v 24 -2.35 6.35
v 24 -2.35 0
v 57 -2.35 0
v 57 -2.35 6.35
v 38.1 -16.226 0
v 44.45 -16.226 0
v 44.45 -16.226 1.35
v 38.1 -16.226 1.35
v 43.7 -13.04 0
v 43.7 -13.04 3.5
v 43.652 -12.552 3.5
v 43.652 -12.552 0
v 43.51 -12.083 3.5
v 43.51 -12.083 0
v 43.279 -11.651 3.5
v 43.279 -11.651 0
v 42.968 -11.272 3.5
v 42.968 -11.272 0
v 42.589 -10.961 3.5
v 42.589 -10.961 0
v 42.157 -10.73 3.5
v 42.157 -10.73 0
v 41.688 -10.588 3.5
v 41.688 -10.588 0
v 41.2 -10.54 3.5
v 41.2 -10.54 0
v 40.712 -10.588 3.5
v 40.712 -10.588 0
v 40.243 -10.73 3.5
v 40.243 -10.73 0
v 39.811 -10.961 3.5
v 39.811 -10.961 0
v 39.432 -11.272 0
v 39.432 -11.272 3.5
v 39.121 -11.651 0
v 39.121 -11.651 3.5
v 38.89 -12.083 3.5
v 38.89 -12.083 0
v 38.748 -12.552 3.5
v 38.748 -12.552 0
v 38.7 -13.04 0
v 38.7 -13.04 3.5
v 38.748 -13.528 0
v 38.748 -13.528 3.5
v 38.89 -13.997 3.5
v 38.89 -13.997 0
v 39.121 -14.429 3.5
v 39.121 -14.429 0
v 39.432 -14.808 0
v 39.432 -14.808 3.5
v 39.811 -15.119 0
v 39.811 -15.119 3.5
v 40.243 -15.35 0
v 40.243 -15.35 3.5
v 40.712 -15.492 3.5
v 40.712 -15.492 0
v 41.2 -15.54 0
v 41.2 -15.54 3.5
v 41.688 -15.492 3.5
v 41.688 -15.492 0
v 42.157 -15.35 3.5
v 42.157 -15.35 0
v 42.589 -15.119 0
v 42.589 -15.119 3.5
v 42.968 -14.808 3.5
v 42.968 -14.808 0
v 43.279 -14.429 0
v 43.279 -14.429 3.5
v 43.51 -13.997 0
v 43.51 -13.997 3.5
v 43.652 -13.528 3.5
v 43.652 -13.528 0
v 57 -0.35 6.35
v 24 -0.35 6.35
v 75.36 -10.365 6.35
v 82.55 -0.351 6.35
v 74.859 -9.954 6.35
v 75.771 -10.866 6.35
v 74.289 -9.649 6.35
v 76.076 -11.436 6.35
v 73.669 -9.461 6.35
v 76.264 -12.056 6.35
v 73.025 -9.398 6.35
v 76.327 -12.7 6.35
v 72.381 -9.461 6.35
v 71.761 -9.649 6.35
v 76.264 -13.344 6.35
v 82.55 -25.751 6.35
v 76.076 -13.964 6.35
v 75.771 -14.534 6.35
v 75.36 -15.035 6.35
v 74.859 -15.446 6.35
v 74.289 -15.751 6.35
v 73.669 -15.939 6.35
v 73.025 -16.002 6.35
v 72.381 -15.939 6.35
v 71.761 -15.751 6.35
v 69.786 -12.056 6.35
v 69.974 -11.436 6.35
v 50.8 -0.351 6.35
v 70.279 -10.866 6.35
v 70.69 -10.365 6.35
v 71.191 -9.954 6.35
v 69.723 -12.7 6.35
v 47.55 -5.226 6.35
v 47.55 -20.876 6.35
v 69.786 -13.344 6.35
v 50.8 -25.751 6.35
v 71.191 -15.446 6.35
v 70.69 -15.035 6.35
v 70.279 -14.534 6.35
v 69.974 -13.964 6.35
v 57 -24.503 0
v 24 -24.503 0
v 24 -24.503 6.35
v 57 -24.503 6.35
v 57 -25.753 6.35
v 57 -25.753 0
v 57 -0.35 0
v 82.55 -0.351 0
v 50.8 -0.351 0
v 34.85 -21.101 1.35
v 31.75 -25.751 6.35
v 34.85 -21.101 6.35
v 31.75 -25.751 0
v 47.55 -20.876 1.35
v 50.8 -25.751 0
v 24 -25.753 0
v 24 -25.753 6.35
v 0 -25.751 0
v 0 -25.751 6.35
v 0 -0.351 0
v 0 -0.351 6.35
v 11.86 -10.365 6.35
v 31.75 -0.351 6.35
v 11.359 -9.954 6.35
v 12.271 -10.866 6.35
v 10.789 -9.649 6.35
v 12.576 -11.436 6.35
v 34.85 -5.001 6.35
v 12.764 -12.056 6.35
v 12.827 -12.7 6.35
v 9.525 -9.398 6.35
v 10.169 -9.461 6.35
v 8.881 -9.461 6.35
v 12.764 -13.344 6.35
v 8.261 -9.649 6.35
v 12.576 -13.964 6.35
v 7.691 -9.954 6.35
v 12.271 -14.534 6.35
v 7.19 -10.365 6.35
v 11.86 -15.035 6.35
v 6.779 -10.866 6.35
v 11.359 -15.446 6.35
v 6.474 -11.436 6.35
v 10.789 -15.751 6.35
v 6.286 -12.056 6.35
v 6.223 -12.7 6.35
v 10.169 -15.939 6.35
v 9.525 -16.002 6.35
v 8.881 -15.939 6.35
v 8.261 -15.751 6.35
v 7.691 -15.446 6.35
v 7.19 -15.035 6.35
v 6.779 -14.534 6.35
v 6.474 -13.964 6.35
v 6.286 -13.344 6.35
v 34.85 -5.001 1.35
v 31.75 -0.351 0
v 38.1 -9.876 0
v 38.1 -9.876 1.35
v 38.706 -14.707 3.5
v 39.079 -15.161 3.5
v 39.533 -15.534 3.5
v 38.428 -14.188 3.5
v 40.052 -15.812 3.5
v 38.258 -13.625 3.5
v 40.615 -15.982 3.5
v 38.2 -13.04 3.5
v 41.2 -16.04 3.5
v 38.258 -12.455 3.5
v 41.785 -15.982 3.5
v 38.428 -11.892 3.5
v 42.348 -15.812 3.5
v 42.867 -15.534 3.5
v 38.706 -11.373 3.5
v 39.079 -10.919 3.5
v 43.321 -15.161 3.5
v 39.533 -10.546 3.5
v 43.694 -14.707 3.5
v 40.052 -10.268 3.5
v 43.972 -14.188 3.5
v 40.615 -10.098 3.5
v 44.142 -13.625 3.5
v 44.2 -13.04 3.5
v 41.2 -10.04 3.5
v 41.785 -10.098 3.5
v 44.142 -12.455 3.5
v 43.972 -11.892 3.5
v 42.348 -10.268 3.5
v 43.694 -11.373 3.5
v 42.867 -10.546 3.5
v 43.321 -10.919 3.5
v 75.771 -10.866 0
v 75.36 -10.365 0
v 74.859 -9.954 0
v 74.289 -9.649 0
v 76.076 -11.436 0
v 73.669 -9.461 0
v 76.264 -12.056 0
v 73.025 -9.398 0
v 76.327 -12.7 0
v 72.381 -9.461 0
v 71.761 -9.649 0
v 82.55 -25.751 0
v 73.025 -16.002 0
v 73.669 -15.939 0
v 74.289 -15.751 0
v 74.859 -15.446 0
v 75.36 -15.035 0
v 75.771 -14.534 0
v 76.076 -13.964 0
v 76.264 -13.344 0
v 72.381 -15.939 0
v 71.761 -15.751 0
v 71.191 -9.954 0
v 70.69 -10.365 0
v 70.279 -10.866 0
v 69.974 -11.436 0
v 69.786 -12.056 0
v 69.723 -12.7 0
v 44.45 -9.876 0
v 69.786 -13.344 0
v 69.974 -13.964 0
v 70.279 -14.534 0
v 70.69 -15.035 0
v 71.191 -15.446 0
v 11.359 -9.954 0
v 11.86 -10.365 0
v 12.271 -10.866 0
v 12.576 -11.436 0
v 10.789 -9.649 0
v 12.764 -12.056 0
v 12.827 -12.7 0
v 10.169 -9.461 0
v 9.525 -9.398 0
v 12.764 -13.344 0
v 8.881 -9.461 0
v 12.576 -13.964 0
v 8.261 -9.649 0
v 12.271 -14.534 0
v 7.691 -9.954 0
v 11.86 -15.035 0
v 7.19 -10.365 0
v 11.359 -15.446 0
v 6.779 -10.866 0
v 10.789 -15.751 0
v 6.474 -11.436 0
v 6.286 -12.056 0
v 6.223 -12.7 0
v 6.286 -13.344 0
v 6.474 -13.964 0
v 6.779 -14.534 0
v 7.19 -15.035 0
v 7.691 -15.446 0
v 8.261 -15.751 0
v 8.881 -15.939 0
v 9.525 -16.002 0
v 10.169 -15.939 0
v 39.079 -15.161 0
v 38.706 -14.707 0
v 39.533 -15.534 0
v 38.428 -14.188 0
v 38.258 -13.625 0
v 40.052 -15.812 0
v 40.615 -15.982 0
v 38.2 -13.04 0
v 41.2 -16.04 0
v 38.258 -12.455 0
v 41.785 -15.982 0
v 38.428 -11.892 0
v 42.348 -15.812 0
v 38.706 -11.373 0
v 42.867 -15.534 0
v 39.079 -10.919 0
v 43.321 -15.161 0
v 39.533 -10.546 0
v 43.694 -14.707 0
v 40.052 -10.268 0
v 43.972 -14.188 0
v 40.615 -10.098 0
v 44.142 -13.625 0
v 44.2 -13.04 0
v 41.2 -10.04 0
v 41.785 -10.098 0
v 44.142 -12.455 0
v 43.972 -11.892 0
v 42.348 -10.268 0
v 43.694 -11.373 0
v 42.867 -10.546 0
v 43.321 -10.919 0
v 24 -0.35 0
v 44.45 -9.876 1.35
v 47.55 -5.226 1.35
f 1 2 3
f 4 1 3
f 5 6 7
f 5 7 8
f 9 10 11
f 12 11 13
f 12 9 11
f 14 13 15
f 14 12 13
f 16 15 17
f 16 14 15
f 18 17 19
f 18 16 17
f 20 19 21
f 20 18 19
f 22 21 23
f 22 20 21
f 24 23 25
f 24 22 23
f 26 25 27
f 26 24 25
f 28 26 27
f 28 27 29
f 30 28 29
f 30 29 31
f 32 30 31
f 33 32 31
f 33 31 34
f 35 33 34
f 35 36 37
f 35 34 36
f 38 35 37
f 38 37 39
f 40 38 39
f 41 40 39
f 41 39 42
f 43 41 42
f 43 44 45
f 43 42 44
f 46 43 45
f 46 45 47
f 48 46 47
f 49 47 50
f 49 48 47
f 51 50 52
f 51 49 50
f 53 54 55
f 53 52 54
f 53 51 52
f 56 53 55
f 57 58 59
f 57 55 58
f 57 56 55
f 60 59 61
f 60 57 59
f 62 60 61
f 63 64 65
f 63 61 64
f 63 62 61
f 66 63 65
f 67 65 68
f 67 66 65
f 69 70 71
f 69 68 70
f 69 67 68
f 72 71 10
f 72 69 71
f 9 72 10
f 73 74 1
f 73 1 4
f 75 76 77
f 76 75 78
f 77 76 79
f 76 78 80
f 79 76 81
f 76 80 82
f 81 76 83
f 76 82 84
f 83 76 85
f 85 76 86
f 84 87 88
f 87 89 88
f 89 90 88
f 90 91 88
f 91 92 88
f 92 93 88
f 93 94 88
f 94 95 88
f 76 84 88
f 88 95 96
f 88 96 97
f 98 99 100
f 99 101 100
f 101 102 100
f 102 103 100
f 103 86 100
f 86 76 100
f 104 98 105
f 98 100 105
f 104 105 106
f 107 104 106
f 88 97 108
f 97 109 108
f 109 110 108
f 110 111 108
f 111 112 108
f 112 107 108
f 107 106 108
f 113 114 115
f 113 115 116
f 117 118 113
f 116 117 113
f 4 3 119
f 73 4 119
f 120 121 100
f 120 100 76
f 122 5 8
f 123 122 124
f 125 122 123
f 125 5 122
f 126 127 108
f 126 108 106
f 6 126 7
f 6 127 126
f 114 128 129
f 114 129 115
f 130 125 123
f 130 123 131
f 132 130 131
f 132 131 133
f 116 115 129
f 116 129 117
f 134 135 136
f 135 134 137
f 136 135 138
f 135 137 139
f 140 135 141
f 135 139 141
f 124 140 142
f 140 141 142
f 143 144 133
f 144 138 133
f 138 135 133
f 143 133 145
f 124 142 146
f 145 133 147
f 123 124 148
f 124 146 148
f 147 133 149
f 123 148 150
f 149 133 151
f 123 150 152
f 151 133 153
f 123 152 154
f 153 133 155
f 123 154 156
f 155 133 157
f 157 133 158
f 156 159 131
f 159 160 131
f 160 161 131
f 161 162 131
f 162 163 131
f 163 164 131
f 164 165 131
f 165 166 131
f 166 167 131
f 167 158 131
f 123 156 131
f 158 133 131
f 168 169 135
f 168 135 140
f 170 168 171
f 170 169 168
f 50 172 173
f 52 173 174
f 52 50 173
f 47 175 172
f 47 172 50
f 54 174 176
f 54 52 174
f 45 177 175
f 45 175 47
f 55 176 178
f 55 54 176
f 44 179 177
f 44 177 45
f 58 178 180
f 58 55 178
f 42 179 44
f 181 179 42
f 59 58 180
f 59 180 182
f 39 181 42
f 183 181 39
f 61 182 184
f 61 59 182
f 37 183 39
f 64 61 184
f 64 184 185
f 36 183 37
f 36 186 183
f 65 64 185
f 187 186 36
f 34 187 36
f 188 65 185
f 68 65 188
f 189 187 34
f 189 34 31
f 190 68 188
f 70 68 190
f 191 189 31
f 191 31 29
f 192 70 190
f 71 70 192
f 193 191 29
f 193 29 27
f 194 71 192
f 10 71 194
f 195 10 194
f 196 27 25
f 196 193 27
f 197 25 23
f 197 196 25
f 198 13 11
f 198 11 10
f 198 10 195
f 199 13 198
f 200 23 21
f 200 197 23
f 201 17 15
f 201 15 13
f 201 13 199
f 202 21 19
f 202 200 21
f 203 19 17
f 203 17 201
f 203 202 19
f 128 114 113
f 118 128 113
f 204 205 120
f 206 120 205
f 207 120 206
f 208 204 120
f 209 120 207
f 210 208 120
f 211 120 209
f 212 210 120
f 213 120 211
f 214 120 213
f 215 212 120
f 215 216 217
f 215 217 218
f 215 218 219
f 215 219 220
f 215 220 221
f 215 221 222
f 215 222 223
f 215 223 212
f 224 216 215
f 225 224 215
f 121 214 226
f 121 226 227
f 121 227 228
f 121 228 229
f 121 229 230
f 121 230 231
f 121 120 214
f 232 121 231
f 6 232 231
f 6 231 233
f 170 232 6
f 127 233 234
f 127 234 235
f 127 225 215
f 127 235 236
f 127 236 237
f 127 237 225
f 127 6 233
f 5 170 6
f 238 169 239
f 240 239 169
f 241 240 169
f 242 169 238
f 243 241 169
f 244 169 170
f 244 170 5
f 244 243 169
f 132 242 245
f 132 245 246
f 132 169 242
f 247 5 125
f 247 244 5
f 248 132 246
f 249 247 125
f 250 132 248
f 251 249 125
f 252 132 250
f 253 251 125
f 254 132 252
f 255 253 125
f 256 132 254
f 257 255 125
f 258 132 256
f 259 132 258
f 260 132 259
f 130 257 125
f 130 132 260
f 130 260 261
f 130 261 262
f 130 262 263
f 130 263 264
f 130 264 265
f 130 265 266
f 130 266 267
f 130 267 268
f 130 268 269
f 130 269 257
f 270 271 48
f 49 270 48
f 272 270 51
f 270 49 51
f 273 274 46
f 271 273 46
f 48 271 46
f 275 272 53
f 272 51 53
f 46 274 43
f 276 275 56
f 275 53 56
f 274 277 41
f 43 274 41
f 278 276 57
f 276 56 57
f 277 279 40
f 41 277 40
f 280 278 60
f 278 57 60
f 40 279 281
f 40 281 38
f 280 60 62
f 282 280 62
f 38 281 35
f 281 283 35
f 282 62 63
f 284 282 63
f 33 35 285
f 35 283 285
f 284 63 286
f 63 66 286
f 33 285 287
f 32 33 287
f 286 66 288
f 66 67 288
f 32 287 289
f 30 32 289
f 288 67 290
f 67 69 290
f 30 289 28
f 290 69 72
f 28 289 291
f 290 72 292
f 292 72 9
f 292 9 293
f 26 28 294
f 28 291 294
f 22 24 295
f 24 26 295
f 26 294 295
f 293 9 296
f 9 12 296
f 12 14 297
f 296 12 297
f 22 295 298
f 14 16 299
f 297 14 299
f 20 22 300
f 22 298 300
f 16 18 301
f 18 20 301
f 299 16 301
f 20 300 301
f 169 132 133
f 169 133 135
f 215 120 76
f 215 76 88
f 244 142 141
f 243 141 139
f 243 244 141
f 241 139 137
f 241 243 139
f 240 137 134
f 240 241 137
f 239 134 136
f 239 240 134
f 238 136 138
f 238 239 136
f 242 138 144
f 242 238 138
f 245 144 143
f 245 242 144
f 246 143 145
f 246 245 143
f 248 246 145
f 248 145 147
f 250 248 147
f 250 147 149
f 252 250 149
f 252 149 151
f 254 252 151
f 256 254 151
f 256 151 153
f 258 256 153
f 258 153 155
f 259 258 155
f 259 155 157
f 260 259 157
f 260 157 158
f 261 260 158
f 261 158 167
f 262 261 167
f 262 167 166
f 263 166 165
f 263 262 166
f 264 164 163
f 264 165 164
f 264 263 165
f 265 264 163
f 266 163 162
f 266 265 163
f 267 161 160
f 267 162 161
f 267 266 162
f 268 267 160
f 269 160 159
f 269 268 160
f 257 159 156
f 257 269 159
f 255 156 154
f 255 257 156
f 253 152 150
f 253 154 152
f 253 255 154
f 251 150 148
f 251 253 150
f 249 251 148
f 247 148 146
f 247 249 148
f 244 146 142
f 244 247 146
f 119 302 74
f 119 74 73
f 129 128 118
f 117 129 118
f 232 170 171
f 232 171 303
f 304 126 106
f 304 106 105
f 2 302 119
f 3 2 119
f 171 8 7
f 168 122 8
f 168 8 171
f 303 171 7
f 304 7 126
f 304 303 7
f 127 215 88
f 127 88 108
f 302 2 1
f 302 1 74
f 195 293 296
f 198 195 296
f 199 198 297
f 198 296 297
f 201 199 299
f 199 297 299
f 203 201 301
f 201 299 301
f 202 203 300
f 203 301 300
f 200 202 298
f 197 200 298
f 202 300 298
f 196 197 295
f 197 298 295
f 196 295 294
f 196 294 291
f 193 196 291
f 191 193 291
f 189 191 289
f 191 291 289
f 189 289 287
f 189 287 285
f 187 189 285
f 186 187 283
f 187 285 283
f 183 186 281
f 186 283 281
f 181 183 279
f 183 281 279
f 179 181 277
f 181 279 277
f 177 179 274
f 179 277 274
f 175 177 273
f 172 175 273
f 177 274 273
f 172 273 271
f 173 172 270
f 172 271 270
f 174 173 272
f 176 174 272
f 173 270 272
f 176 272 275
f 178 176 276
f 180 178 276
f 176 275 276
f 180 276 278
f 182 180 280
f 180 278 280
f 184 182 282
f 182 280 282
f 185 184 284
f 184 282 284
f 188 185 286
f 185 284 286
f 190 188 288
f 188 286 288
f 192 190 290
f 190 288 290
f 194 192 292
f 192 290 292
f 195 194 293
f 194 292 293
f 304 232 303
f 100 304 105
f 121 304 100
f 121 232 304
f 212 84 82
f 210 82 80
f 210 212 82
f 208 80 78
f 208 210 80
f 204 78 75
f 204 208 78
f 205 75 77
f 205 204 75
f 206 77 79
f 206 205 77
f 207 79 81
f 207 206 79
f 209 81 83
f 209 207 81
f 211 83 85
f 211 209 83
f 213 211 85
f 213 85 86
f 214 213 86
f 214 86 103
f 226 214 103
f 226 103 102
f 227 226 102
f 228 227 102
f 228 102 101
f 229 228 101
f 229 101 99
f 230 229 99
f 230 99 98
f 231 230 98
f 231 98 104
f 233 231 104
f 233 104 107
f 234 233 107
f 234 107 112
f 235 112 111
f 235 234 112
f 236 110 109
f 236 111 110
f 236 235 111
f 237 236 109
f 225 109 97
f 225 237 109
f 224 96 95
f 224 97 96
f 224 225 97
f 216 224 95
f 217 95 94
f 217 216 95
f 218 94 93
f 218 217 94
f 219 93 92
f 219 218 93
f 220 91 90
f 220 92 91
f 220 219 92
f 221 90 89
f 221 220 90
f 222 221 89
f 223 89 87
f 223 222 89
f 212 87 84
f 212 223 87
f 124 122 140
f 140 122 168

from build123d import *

# Parameters (mm, degrees)
BOX_W             = 33
BOX_H             = 2
BOX_DEPTH         = 6.35
BOX001_W          = 33
BOX001_H          = 1.25
BOX001_DEPTH      = 6.35
CYLINDER001_R     = 3.302
CYLINDER001_DEPTH = 10
BOX002_W          = 12.7
BOX002_H          = 16.7
BOX002_DEPTH      = 17
CYLINDER_R        = 3.302
CYLINDER_DEPTH    = 10
EXTRUDE_DEPTH     = 6.35
CYLINDER003_R     = 2.5
CYLINDER003_DEPTH = 16
CYLINDER002_R     = 3
CYLINDER002_DEPTH = 3.5


with BuildPart() as support1:
    # Box → Box (new body)
    with BuildSketch(Plane(origin=(24, -2.35, 0), x_dir=(1, 0, 0), z_dir=(0, 0, 1))):
        with Locations((16.5, 1)):
            Rectangle(BOX_W, BOX_H)
    extrude(amount=BOX_DEPTH)


with BuildPart() as support2:
    # Box001 → Box001 (new body)
    with BuildSketch(Plane(origin=(24, -25.753, 0), x_dir=(1, 0, 0), z_dir=(0, 0, 1))):
        with Locations((16.5, 0.625)):
            Rectangle(BOX001_W, BOX001_H)
    extrude(amount=BOX001_DEPTH)


with BuildPart() as hole2:
    # Cylinder001 → Cylinder001 (new body)
    with BuildSketch(Plane(origin=(73.025, -12.7, 0), x_dir=(1, 0, 0), z_dir=(0, 0, 1))):
        Circle(CYLINDER001_R)
    extrude(amount=CYLINDER001_DEPTH)


with BuildPart() as thinner:
    # Box002 → Box002 (new body)
    with BuildSketch(Plane(origin=(34.85, -21.35, 1.35), x_dir=(1, 0, 0), z_dir=(0, 0, 1))):
        with Locations((6.35, 8.35)):
            Rectangle(BOX002_W, BOX002_H)
    extrude(amount=BOX002_DEPTH)


with BuildPart() as fusion:
    # Cylinder → Cylinder (new body)
    with BuildSketch(Plane(origin=(9.525, -12.7, 0), x_dir=(1, 0, 0), z_dir=(0, 0, 1))):
        Circle(CYLINDER_R)
    extrude(amount=CYLINDER_DEPTH)

    # Fusion: union Hole2, Thinner
    add(hole2.part)
    add(thinner.part)


with BuildPart() as cut:
    # rect3338 → Extrude (new body)
    with BuildSketch(Plane(origin=(41.275, -13.050916, 0), x_dir=(0, -1, 0), z_dir=(0, 0, -1))):
        with BuildLine():
            add(Edge.make_bspline(
                [(-12.7, 41.275), (-12.7, 9.525)],
                knots=[0, 0, 112.5, 112.5], degree=1))
            add(Edge.make_bspline(
                [(-12.7, 9.525), (-3.175, 3.175)],
                knots=[0, 0, 40.562452, 40.562452], degree=1))
            add(Edge.make_bspline(
                [(-3.175, 3.175), (-3.175, -3.175)],
                knots=[0, 0, 22.5, 22.5], degree=1))
            add(Edge.make_bspline(
                [(-3.175, -3.175), (-12.7, -9.525)],
                knots=[0, 0, 40.562452, 40.562452], degree=1))
            add(Edge.make_bspline(
                [(-12.7, -9.525), (-12.7, -41.275)],
                knots=[0, 0, 112.5, 112.5], degree=1))
            add(Edge.make_bspline(
                [(-12.7, -41.275), (12.7, -41.275)],
                knots=[0, 0, 90, 90], degree=1))
            add(Edge.make_bspline(
                [(12.7, -41.275), (12.7, -9.525)],
                knots=[0, 0, 112.5, 112.5], degree=1))
            add(Edge.make_bspline(
                [(12.7, -9.525), (3.175, -3.175)],
                knots=[0, 0, 40.562452, 40.562452], degree=1))
            add(Edge.make_bspline(
                [(3.175, -3.175), (3.175, 3.175)],
                knots=[0, 0, 22.5, 22.5], degree=1))
            add(Edge.make_bspline(
                [(3.175, 3.175), (12.7, 9.525)],
                knots=[0, 0, 40.562452, 40.562452], degree=1))
            add(Edge.make_bspline(
                [(12.7, 9.525), (12.7, 41.275)],
                knots=[0, 0, 112.5, 112.5], degree=1))
            add(Edge.make_bspline(
                [(12.7, 41.275), (-12.7, 41.275)],
                knots=[0, 0, 90, 90], degree=1))
        make_face()
    extrude(amount=-EXTRUDE_DEPTH)

    # Cut: cut Fusion
    add(fusion.part, mode=Mode.SUBTRACT)


with BuildPart() as cylinder001:
    # Cylinder003 → Cylinder003 (new body)
    with BuildSketch(Plane(origin=(41.2, -13.04, 0), x_dir=(1, 0, 0), z_dir=(0, 0, 1))):
        Circle(CYLINDER003_R)
    extrude(amount=CYLINDER003_DEPTH)


with BuildPart() as cut001:
    # Cylinder002 → Cylinder002 (new body)
    with BuildSketch(Plane(origin=(41.2, -13.04, 0), x_dir=(1, 0, 0), z_dir=(0, 0, 1))):
        Circle(CYLINDER002_R)
    extrude(amount=CYLINDER002_DEPTH)

    # Cut001: cut Cylinder001
    add(cylinder001.part, mode=Mode.SUBTRACT)


solid = Compound([support1.part, support2.part, cut.part, cut001.part])
